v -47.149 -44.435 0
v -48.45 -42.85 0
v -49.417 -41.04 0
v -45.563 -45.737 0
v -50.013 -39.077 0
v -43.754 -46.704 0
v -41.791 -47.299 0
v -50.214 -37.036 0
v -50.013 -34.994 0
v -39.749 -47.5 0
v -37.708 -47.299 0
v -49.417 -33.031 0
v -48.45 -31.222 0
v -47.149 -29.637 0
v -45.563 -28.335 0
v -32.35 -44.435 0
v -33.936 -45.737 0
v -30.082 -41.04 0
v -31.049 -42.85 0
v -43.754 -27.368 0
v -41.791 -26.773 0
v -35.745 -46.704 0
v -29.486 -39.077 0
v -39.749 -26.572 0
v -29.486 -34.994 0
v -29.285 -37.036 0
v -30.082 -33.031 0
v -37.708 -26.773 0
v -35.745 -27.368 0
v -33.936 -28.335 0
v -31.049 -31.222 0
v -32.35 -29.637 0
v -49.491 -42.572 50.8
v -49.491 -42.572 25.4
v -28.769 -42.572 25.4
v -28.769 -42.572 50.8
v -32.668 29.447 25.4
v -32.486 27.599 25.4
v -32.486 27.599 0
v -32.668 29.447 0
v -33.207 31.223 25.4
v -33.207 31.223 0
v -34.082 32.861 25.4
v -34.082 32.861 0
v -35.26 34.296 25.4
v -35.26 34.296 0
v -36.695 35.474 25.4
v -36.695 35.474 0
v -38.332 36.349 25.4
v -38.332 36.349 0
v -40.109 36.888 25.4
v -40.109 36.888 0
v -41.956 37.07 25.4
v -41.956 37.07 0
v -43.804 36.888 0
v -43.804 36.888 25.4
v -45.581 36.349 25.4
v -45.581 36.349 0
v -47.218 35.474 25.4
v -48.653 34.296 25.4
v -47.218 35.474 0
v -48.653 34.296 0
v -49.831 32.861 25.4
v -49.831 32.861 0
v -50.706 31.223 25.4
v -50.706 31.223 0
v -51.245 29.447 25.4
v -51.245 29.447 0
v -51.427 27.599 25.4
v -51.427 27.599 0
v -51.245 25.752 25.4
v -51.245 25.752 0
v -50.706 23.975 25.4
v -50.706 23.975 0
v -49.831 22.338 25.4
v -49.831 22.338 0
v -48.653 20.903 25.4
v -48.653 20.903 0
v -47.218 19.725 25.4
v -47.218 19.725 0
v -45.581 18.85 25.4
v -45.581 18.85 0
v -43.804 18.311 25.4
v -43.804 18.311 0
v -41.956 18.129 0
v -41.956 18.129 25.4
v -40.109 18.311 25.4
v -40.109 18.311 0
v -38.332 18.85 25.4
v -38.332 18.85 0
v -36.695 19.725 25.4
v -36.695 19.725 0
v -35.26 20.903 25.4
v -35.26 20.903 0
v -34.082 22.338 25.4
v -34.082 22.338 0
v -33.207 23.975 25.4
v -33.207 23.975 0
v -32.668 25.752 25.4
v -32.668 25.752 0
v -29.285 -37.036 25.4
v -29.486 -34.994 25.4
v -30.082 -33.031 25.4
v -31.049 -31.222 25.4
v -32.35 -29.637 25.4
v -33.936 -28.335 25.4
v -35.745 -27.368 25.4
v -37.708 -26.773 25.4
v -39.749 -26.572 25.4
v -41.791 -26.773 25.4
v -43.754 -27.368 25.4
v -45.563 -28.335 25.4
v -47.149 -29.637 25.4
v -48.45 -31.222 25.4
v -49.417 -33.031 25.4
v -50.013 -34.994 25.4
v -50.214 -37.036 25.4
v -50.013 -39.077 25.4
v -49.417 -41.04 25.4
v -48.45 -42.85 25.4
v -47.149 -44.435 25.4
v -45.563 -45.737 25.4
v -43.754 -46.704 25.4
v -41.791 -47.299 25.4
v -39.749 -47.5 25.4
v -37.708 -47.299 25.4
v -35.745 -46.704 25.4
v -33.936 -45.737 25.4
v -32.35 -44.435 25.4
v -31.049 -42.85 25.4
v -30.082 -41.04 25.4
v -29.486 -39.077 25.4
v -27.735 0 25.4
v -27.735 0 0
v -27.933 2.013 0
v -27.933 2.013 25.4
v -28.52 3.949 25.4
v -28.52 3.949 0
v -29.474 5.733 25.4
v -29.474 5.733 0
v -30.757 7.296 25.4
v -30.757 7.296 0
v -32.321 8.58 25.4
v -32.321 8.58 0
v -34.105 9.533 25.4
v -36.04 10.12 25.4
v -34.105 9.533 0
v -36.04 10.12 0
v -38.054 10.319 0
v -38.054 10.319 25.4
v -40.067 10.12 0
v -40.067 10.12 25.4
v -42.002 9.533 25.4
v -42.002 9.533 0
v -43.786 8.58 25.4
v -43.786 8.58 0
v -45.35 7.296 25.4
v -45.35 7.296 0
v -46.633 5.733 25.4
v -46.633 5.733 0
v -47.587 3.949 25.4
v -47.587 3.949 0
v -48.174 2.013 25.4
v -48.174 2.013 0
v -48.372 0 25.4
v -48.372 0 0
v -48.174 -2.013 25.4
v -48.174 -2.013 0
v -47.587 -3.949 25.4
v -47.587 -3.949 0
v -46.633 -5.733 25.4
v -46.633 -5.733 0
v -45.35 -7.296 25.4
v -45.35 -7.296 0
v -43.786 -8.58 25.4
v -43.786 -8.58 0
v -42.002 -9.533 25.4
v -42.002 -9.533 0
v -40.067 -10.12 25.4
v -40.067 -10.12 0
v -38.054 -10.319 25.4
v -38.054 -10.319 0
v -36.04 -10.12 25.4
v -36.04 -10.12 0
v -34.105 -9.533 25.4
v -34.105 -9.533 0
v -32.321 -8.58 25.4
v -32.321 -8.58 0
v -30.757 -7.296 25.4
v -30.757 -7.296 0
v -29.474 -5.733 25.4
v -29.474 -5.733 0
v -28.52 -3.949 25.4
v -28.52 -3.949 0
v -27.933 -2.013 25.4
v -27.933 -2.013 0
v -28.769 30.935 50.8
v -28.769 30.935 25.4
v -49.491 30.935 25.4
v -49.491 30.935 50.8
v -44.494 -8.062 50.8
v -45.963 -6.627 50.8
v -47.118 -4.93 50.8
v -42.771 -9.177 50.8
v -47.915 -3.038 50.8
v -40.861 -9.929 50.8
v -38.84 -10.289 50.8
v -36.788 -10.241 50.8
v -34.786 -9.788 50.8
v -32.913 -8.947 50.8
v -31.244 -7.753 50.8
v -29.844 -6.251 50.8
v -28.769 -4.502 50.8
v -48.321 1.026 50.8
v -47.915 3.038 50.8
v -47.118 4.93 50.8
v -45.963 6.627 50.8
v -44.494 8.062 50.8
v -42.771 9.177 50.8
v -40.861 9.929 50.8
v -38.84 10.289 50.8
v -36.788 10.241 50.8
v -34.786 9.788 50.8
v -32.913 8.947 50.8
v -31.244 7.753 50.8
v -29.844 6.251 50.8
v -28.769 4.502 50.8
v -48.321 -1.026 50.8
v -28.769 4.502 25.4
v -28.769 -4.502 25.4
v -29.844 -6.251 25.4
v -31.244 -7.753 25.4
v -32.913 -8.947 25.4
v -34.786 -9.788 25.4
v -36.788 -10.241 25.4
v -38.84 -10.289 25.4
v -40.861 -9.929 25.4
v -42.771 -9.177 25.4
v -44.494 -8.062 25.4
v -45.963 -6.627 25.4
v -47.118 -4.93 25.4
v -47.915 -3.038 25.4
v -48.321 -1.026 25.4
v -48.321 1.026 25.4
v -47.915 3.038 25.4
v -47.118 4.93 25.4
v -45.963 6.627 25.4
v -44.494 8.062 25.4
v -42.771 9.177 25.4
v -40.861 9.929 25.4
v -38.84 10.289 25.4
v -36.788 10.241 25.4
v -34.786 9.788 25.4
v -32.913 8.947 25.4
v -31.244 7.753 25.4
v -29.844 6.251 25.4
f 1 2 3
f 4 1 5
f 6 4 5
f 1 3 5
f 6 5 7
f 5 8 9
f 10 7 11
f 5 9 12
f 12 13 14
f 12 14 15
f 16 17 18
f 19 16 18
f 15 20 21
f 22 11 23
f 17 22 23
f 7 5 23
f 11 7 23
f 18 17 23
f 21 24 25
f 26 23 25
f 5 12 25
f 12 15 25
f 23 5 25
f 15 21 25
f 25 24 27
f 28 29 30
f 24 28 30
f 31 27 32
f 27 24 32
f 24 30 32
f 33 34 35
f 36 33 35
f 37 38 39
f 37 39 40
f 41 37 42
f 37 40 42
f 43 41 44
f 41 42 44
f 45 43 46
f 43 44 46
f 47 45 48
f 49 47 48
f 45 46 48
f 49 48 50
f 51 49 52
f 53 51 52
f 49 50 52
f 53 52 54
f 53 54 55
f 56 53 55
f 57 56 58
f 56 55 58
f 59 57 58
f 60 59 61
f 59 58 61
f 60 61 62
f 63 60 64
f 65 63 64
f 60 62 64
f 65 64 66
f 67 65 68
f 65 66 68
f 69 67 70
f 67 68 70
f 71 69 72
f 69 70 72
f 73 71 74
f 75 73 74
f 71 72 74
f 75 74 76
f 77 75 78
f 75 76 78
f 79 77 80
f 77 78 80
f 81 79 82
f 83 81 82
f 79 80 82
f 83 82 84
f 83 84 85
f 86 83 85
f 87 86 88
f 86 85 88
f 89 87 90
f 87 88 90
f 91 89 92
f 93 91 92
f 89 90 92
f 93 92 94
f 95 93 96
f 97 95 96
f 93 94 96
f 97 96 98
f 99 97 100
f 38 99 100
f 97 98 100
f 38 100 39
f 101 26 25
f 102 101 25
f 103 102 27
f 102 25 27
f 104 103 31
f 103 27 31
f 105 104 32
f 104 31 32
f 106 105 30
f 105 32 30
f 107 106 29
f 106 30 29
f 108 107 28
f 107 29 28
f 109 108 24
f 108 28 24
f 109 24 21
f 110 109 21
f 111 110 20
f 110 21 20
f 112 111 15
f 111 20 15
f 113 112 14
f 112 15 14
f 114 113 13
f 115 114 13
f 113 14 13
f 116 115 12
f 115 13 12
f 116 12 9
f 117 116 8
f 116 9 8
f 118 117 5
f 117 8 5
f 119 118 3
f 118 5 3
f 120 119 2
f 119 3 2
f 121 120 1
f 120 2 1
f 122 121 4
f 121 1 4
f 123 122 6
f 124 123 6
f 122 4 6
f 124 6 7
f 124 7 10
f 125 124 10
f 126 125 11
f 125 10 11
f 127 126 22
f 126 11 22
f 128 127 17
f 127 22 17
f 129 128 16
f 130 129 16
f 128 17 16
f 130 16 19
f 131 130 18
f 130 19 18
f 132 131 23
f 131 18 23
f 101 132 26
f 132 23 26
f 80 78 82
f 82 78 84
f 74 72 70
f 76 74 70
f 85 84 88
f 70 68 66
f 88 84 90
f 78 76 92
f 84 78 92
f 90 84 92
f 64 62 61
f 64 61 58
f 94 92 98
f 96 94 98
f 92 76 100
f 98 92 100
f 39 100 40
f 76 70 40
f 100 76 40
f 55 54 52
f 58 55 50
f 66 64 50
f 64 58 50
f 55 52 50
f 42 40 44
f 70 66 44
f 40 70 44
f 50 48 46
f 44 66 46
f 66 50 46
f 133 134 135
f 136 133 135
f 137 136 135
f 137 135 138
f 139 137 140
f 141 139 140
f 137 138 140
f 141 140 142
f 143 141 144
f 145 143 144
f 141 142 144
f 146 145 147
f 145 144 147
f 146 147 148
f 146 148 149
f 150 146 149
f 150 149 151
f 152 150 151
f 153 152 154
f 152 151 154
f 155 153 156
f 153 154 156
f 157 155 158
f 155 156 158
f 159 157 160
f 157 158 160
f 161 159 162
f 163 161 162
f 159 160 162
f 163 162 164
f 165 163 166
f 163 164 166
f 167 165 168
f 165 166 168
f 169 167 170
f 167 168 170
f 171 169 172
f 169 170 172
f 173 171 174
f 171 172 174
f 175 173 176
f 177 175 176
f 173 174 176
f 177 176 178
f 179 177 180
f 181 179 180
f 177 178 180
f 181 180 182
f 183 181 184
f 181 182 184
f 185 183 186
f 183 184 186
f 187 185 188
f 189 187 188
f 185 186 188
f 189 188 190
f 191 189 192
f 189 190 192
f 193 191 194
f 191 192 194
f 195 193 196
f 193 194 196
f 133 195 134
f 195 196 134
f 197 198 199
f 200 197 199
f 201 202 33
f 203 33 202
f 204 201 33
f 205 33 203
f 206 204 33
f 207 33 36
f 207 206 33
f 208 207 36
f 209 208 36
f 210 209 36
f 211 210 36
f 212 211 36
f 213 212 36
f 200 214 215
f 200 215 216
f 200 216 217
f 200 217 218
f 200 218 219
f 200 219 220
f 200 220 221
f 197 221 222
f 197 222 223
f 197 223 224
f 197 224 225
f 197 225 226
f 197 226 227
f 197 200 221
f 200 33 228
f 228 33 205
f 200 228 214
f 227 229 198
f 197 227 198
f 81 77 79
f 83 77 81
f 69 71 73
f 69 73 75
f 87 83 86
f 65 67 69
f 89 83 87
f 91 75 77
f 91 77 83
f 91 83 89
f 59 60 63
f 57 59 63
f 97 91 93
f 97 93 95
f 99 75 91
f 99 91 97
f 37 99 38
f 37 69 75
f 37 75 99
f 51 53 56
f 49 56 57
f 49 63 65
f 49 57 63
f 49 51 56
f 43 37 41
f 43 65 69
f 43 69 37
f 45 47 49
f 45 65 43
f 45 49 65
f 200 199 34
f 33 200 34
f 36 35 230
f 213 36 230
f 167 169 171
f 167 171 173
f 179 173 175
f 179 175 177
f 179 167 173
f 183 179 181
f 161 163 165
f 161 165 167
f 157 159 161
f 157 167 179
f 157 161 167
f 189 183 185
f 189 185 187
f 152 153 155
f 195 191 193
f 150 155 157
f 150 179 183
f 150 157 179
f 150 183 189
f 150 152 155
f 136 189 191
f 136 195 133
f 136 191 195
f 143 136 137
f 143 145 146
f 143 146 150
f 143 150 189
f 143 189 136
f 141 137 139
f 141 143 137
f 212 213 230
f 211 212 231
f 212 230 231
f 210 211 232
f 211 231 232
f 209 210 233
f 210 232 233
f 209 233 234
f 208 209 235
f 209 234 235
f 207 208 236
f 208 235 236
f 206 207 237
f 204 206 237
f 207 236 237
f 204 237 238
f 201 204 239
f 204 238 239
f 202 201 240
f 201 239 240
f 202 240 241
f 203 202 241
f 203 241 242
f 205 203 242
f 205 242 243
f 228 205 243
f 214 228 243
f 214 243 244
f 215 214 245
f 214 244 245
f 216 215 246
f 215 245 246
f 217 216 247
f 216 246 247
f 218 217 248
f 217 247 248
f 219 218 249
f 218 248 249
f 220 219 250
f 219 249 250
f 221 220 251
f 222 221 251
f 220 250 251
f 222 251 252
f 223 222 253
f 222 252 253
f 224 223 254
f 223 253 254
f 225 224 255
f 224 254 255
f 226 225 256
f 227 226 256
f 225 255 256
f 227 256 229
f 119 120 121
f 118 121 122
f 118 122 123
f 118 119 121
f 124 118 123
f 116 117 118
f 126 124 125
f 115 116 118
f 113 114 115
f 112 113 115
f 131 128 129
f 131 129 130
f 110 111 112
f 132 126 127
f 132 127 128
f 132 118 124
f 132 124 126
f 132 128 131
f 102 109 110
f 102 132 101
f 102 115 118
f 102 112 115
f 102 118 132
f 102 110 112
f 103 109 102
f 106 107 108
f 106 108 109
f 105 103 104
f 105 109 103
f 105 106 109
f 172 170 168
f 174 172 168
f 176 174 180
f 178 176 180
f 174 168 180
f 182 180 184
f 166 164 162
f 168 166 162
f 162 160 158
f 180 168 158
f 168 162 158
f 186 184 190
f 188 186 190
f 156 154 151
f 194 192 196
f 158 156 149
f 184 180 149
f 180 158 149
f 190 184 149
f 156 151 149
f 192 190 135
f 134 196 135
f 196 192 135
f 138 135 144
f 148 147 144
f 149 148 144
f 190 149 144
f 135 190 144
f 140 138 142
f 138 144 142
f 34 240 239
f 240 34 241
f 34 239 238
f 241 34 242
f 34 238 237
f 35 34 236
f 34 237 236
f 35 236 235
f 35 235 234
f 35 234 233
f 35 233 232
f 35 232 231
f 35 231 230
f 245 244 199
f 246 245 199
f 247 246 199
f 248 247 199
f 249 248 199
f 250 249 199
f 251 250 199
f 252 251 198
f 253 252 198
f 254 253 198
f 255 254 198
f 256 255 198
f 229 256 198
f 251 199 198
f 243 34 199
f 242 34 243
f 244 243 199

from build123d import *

# Parameters (mm, degrees)
F0_R     = 10.318645
F1_DEPTH = 25.4
F2_R     = 9.470336
F3_DEPTH = 25.4
F4_R     = 10.464223
F5_DEPTH = 25.4
F7_DEPTH = 25.4


with BuildPart() as f1:
    # F0 (on Top) → F1 (new body)
    with BuildSketch(Plane.XY):
        with Locations((-38.053539, 0)):
            Circle(F0_R)
    extrude(amount=F1_DEPTH)


with BuildPart() as f3:
    # F2 (on Top) → F3 (new body)
    with BuildSketch(Plane.XY):
        with Locations((-41.956466, 27.599268)):
            Circle(F2_R)
    extrude(amount=F3_DEPTH)


with BuildPart() as f5:
    # F4 (on Top) → F5 (new body)
    with BuildSketch(Plane.XY):
        with Locations((-39.749462, -37.035935)):
            Circle(F4_R)
    extrude(amount=F5_DEPTH)


with BuildPart() as f7:
    # F6 (on face) → F7 (new body)
    with BuildSketch(Plane.XY.offset(25.4)):
        with BuildLine():
            Line((-28.768998, 30.934986), (-49.490601, 30.934986))
            Line((-49.490601, 30.934986), (-49.490601, -42.572353))
            Line((-49.490601, -42.572353), (-28.768998, -42.572353))
            Line((-28.768998, -42.572353), (-28.768998, -4.502413))
            ThreePointArc((-28.768998, -4.502413), (-48.372183, 0), (-28.768998, 4.502413))
            Line((-28.768998, 4.502413), (-28.768998, 30.934986))
        make_face()
    extrude(amount=F7_DEPTH)


solid = Compound([f1.part, f3.part, f5.part, f7.part])
